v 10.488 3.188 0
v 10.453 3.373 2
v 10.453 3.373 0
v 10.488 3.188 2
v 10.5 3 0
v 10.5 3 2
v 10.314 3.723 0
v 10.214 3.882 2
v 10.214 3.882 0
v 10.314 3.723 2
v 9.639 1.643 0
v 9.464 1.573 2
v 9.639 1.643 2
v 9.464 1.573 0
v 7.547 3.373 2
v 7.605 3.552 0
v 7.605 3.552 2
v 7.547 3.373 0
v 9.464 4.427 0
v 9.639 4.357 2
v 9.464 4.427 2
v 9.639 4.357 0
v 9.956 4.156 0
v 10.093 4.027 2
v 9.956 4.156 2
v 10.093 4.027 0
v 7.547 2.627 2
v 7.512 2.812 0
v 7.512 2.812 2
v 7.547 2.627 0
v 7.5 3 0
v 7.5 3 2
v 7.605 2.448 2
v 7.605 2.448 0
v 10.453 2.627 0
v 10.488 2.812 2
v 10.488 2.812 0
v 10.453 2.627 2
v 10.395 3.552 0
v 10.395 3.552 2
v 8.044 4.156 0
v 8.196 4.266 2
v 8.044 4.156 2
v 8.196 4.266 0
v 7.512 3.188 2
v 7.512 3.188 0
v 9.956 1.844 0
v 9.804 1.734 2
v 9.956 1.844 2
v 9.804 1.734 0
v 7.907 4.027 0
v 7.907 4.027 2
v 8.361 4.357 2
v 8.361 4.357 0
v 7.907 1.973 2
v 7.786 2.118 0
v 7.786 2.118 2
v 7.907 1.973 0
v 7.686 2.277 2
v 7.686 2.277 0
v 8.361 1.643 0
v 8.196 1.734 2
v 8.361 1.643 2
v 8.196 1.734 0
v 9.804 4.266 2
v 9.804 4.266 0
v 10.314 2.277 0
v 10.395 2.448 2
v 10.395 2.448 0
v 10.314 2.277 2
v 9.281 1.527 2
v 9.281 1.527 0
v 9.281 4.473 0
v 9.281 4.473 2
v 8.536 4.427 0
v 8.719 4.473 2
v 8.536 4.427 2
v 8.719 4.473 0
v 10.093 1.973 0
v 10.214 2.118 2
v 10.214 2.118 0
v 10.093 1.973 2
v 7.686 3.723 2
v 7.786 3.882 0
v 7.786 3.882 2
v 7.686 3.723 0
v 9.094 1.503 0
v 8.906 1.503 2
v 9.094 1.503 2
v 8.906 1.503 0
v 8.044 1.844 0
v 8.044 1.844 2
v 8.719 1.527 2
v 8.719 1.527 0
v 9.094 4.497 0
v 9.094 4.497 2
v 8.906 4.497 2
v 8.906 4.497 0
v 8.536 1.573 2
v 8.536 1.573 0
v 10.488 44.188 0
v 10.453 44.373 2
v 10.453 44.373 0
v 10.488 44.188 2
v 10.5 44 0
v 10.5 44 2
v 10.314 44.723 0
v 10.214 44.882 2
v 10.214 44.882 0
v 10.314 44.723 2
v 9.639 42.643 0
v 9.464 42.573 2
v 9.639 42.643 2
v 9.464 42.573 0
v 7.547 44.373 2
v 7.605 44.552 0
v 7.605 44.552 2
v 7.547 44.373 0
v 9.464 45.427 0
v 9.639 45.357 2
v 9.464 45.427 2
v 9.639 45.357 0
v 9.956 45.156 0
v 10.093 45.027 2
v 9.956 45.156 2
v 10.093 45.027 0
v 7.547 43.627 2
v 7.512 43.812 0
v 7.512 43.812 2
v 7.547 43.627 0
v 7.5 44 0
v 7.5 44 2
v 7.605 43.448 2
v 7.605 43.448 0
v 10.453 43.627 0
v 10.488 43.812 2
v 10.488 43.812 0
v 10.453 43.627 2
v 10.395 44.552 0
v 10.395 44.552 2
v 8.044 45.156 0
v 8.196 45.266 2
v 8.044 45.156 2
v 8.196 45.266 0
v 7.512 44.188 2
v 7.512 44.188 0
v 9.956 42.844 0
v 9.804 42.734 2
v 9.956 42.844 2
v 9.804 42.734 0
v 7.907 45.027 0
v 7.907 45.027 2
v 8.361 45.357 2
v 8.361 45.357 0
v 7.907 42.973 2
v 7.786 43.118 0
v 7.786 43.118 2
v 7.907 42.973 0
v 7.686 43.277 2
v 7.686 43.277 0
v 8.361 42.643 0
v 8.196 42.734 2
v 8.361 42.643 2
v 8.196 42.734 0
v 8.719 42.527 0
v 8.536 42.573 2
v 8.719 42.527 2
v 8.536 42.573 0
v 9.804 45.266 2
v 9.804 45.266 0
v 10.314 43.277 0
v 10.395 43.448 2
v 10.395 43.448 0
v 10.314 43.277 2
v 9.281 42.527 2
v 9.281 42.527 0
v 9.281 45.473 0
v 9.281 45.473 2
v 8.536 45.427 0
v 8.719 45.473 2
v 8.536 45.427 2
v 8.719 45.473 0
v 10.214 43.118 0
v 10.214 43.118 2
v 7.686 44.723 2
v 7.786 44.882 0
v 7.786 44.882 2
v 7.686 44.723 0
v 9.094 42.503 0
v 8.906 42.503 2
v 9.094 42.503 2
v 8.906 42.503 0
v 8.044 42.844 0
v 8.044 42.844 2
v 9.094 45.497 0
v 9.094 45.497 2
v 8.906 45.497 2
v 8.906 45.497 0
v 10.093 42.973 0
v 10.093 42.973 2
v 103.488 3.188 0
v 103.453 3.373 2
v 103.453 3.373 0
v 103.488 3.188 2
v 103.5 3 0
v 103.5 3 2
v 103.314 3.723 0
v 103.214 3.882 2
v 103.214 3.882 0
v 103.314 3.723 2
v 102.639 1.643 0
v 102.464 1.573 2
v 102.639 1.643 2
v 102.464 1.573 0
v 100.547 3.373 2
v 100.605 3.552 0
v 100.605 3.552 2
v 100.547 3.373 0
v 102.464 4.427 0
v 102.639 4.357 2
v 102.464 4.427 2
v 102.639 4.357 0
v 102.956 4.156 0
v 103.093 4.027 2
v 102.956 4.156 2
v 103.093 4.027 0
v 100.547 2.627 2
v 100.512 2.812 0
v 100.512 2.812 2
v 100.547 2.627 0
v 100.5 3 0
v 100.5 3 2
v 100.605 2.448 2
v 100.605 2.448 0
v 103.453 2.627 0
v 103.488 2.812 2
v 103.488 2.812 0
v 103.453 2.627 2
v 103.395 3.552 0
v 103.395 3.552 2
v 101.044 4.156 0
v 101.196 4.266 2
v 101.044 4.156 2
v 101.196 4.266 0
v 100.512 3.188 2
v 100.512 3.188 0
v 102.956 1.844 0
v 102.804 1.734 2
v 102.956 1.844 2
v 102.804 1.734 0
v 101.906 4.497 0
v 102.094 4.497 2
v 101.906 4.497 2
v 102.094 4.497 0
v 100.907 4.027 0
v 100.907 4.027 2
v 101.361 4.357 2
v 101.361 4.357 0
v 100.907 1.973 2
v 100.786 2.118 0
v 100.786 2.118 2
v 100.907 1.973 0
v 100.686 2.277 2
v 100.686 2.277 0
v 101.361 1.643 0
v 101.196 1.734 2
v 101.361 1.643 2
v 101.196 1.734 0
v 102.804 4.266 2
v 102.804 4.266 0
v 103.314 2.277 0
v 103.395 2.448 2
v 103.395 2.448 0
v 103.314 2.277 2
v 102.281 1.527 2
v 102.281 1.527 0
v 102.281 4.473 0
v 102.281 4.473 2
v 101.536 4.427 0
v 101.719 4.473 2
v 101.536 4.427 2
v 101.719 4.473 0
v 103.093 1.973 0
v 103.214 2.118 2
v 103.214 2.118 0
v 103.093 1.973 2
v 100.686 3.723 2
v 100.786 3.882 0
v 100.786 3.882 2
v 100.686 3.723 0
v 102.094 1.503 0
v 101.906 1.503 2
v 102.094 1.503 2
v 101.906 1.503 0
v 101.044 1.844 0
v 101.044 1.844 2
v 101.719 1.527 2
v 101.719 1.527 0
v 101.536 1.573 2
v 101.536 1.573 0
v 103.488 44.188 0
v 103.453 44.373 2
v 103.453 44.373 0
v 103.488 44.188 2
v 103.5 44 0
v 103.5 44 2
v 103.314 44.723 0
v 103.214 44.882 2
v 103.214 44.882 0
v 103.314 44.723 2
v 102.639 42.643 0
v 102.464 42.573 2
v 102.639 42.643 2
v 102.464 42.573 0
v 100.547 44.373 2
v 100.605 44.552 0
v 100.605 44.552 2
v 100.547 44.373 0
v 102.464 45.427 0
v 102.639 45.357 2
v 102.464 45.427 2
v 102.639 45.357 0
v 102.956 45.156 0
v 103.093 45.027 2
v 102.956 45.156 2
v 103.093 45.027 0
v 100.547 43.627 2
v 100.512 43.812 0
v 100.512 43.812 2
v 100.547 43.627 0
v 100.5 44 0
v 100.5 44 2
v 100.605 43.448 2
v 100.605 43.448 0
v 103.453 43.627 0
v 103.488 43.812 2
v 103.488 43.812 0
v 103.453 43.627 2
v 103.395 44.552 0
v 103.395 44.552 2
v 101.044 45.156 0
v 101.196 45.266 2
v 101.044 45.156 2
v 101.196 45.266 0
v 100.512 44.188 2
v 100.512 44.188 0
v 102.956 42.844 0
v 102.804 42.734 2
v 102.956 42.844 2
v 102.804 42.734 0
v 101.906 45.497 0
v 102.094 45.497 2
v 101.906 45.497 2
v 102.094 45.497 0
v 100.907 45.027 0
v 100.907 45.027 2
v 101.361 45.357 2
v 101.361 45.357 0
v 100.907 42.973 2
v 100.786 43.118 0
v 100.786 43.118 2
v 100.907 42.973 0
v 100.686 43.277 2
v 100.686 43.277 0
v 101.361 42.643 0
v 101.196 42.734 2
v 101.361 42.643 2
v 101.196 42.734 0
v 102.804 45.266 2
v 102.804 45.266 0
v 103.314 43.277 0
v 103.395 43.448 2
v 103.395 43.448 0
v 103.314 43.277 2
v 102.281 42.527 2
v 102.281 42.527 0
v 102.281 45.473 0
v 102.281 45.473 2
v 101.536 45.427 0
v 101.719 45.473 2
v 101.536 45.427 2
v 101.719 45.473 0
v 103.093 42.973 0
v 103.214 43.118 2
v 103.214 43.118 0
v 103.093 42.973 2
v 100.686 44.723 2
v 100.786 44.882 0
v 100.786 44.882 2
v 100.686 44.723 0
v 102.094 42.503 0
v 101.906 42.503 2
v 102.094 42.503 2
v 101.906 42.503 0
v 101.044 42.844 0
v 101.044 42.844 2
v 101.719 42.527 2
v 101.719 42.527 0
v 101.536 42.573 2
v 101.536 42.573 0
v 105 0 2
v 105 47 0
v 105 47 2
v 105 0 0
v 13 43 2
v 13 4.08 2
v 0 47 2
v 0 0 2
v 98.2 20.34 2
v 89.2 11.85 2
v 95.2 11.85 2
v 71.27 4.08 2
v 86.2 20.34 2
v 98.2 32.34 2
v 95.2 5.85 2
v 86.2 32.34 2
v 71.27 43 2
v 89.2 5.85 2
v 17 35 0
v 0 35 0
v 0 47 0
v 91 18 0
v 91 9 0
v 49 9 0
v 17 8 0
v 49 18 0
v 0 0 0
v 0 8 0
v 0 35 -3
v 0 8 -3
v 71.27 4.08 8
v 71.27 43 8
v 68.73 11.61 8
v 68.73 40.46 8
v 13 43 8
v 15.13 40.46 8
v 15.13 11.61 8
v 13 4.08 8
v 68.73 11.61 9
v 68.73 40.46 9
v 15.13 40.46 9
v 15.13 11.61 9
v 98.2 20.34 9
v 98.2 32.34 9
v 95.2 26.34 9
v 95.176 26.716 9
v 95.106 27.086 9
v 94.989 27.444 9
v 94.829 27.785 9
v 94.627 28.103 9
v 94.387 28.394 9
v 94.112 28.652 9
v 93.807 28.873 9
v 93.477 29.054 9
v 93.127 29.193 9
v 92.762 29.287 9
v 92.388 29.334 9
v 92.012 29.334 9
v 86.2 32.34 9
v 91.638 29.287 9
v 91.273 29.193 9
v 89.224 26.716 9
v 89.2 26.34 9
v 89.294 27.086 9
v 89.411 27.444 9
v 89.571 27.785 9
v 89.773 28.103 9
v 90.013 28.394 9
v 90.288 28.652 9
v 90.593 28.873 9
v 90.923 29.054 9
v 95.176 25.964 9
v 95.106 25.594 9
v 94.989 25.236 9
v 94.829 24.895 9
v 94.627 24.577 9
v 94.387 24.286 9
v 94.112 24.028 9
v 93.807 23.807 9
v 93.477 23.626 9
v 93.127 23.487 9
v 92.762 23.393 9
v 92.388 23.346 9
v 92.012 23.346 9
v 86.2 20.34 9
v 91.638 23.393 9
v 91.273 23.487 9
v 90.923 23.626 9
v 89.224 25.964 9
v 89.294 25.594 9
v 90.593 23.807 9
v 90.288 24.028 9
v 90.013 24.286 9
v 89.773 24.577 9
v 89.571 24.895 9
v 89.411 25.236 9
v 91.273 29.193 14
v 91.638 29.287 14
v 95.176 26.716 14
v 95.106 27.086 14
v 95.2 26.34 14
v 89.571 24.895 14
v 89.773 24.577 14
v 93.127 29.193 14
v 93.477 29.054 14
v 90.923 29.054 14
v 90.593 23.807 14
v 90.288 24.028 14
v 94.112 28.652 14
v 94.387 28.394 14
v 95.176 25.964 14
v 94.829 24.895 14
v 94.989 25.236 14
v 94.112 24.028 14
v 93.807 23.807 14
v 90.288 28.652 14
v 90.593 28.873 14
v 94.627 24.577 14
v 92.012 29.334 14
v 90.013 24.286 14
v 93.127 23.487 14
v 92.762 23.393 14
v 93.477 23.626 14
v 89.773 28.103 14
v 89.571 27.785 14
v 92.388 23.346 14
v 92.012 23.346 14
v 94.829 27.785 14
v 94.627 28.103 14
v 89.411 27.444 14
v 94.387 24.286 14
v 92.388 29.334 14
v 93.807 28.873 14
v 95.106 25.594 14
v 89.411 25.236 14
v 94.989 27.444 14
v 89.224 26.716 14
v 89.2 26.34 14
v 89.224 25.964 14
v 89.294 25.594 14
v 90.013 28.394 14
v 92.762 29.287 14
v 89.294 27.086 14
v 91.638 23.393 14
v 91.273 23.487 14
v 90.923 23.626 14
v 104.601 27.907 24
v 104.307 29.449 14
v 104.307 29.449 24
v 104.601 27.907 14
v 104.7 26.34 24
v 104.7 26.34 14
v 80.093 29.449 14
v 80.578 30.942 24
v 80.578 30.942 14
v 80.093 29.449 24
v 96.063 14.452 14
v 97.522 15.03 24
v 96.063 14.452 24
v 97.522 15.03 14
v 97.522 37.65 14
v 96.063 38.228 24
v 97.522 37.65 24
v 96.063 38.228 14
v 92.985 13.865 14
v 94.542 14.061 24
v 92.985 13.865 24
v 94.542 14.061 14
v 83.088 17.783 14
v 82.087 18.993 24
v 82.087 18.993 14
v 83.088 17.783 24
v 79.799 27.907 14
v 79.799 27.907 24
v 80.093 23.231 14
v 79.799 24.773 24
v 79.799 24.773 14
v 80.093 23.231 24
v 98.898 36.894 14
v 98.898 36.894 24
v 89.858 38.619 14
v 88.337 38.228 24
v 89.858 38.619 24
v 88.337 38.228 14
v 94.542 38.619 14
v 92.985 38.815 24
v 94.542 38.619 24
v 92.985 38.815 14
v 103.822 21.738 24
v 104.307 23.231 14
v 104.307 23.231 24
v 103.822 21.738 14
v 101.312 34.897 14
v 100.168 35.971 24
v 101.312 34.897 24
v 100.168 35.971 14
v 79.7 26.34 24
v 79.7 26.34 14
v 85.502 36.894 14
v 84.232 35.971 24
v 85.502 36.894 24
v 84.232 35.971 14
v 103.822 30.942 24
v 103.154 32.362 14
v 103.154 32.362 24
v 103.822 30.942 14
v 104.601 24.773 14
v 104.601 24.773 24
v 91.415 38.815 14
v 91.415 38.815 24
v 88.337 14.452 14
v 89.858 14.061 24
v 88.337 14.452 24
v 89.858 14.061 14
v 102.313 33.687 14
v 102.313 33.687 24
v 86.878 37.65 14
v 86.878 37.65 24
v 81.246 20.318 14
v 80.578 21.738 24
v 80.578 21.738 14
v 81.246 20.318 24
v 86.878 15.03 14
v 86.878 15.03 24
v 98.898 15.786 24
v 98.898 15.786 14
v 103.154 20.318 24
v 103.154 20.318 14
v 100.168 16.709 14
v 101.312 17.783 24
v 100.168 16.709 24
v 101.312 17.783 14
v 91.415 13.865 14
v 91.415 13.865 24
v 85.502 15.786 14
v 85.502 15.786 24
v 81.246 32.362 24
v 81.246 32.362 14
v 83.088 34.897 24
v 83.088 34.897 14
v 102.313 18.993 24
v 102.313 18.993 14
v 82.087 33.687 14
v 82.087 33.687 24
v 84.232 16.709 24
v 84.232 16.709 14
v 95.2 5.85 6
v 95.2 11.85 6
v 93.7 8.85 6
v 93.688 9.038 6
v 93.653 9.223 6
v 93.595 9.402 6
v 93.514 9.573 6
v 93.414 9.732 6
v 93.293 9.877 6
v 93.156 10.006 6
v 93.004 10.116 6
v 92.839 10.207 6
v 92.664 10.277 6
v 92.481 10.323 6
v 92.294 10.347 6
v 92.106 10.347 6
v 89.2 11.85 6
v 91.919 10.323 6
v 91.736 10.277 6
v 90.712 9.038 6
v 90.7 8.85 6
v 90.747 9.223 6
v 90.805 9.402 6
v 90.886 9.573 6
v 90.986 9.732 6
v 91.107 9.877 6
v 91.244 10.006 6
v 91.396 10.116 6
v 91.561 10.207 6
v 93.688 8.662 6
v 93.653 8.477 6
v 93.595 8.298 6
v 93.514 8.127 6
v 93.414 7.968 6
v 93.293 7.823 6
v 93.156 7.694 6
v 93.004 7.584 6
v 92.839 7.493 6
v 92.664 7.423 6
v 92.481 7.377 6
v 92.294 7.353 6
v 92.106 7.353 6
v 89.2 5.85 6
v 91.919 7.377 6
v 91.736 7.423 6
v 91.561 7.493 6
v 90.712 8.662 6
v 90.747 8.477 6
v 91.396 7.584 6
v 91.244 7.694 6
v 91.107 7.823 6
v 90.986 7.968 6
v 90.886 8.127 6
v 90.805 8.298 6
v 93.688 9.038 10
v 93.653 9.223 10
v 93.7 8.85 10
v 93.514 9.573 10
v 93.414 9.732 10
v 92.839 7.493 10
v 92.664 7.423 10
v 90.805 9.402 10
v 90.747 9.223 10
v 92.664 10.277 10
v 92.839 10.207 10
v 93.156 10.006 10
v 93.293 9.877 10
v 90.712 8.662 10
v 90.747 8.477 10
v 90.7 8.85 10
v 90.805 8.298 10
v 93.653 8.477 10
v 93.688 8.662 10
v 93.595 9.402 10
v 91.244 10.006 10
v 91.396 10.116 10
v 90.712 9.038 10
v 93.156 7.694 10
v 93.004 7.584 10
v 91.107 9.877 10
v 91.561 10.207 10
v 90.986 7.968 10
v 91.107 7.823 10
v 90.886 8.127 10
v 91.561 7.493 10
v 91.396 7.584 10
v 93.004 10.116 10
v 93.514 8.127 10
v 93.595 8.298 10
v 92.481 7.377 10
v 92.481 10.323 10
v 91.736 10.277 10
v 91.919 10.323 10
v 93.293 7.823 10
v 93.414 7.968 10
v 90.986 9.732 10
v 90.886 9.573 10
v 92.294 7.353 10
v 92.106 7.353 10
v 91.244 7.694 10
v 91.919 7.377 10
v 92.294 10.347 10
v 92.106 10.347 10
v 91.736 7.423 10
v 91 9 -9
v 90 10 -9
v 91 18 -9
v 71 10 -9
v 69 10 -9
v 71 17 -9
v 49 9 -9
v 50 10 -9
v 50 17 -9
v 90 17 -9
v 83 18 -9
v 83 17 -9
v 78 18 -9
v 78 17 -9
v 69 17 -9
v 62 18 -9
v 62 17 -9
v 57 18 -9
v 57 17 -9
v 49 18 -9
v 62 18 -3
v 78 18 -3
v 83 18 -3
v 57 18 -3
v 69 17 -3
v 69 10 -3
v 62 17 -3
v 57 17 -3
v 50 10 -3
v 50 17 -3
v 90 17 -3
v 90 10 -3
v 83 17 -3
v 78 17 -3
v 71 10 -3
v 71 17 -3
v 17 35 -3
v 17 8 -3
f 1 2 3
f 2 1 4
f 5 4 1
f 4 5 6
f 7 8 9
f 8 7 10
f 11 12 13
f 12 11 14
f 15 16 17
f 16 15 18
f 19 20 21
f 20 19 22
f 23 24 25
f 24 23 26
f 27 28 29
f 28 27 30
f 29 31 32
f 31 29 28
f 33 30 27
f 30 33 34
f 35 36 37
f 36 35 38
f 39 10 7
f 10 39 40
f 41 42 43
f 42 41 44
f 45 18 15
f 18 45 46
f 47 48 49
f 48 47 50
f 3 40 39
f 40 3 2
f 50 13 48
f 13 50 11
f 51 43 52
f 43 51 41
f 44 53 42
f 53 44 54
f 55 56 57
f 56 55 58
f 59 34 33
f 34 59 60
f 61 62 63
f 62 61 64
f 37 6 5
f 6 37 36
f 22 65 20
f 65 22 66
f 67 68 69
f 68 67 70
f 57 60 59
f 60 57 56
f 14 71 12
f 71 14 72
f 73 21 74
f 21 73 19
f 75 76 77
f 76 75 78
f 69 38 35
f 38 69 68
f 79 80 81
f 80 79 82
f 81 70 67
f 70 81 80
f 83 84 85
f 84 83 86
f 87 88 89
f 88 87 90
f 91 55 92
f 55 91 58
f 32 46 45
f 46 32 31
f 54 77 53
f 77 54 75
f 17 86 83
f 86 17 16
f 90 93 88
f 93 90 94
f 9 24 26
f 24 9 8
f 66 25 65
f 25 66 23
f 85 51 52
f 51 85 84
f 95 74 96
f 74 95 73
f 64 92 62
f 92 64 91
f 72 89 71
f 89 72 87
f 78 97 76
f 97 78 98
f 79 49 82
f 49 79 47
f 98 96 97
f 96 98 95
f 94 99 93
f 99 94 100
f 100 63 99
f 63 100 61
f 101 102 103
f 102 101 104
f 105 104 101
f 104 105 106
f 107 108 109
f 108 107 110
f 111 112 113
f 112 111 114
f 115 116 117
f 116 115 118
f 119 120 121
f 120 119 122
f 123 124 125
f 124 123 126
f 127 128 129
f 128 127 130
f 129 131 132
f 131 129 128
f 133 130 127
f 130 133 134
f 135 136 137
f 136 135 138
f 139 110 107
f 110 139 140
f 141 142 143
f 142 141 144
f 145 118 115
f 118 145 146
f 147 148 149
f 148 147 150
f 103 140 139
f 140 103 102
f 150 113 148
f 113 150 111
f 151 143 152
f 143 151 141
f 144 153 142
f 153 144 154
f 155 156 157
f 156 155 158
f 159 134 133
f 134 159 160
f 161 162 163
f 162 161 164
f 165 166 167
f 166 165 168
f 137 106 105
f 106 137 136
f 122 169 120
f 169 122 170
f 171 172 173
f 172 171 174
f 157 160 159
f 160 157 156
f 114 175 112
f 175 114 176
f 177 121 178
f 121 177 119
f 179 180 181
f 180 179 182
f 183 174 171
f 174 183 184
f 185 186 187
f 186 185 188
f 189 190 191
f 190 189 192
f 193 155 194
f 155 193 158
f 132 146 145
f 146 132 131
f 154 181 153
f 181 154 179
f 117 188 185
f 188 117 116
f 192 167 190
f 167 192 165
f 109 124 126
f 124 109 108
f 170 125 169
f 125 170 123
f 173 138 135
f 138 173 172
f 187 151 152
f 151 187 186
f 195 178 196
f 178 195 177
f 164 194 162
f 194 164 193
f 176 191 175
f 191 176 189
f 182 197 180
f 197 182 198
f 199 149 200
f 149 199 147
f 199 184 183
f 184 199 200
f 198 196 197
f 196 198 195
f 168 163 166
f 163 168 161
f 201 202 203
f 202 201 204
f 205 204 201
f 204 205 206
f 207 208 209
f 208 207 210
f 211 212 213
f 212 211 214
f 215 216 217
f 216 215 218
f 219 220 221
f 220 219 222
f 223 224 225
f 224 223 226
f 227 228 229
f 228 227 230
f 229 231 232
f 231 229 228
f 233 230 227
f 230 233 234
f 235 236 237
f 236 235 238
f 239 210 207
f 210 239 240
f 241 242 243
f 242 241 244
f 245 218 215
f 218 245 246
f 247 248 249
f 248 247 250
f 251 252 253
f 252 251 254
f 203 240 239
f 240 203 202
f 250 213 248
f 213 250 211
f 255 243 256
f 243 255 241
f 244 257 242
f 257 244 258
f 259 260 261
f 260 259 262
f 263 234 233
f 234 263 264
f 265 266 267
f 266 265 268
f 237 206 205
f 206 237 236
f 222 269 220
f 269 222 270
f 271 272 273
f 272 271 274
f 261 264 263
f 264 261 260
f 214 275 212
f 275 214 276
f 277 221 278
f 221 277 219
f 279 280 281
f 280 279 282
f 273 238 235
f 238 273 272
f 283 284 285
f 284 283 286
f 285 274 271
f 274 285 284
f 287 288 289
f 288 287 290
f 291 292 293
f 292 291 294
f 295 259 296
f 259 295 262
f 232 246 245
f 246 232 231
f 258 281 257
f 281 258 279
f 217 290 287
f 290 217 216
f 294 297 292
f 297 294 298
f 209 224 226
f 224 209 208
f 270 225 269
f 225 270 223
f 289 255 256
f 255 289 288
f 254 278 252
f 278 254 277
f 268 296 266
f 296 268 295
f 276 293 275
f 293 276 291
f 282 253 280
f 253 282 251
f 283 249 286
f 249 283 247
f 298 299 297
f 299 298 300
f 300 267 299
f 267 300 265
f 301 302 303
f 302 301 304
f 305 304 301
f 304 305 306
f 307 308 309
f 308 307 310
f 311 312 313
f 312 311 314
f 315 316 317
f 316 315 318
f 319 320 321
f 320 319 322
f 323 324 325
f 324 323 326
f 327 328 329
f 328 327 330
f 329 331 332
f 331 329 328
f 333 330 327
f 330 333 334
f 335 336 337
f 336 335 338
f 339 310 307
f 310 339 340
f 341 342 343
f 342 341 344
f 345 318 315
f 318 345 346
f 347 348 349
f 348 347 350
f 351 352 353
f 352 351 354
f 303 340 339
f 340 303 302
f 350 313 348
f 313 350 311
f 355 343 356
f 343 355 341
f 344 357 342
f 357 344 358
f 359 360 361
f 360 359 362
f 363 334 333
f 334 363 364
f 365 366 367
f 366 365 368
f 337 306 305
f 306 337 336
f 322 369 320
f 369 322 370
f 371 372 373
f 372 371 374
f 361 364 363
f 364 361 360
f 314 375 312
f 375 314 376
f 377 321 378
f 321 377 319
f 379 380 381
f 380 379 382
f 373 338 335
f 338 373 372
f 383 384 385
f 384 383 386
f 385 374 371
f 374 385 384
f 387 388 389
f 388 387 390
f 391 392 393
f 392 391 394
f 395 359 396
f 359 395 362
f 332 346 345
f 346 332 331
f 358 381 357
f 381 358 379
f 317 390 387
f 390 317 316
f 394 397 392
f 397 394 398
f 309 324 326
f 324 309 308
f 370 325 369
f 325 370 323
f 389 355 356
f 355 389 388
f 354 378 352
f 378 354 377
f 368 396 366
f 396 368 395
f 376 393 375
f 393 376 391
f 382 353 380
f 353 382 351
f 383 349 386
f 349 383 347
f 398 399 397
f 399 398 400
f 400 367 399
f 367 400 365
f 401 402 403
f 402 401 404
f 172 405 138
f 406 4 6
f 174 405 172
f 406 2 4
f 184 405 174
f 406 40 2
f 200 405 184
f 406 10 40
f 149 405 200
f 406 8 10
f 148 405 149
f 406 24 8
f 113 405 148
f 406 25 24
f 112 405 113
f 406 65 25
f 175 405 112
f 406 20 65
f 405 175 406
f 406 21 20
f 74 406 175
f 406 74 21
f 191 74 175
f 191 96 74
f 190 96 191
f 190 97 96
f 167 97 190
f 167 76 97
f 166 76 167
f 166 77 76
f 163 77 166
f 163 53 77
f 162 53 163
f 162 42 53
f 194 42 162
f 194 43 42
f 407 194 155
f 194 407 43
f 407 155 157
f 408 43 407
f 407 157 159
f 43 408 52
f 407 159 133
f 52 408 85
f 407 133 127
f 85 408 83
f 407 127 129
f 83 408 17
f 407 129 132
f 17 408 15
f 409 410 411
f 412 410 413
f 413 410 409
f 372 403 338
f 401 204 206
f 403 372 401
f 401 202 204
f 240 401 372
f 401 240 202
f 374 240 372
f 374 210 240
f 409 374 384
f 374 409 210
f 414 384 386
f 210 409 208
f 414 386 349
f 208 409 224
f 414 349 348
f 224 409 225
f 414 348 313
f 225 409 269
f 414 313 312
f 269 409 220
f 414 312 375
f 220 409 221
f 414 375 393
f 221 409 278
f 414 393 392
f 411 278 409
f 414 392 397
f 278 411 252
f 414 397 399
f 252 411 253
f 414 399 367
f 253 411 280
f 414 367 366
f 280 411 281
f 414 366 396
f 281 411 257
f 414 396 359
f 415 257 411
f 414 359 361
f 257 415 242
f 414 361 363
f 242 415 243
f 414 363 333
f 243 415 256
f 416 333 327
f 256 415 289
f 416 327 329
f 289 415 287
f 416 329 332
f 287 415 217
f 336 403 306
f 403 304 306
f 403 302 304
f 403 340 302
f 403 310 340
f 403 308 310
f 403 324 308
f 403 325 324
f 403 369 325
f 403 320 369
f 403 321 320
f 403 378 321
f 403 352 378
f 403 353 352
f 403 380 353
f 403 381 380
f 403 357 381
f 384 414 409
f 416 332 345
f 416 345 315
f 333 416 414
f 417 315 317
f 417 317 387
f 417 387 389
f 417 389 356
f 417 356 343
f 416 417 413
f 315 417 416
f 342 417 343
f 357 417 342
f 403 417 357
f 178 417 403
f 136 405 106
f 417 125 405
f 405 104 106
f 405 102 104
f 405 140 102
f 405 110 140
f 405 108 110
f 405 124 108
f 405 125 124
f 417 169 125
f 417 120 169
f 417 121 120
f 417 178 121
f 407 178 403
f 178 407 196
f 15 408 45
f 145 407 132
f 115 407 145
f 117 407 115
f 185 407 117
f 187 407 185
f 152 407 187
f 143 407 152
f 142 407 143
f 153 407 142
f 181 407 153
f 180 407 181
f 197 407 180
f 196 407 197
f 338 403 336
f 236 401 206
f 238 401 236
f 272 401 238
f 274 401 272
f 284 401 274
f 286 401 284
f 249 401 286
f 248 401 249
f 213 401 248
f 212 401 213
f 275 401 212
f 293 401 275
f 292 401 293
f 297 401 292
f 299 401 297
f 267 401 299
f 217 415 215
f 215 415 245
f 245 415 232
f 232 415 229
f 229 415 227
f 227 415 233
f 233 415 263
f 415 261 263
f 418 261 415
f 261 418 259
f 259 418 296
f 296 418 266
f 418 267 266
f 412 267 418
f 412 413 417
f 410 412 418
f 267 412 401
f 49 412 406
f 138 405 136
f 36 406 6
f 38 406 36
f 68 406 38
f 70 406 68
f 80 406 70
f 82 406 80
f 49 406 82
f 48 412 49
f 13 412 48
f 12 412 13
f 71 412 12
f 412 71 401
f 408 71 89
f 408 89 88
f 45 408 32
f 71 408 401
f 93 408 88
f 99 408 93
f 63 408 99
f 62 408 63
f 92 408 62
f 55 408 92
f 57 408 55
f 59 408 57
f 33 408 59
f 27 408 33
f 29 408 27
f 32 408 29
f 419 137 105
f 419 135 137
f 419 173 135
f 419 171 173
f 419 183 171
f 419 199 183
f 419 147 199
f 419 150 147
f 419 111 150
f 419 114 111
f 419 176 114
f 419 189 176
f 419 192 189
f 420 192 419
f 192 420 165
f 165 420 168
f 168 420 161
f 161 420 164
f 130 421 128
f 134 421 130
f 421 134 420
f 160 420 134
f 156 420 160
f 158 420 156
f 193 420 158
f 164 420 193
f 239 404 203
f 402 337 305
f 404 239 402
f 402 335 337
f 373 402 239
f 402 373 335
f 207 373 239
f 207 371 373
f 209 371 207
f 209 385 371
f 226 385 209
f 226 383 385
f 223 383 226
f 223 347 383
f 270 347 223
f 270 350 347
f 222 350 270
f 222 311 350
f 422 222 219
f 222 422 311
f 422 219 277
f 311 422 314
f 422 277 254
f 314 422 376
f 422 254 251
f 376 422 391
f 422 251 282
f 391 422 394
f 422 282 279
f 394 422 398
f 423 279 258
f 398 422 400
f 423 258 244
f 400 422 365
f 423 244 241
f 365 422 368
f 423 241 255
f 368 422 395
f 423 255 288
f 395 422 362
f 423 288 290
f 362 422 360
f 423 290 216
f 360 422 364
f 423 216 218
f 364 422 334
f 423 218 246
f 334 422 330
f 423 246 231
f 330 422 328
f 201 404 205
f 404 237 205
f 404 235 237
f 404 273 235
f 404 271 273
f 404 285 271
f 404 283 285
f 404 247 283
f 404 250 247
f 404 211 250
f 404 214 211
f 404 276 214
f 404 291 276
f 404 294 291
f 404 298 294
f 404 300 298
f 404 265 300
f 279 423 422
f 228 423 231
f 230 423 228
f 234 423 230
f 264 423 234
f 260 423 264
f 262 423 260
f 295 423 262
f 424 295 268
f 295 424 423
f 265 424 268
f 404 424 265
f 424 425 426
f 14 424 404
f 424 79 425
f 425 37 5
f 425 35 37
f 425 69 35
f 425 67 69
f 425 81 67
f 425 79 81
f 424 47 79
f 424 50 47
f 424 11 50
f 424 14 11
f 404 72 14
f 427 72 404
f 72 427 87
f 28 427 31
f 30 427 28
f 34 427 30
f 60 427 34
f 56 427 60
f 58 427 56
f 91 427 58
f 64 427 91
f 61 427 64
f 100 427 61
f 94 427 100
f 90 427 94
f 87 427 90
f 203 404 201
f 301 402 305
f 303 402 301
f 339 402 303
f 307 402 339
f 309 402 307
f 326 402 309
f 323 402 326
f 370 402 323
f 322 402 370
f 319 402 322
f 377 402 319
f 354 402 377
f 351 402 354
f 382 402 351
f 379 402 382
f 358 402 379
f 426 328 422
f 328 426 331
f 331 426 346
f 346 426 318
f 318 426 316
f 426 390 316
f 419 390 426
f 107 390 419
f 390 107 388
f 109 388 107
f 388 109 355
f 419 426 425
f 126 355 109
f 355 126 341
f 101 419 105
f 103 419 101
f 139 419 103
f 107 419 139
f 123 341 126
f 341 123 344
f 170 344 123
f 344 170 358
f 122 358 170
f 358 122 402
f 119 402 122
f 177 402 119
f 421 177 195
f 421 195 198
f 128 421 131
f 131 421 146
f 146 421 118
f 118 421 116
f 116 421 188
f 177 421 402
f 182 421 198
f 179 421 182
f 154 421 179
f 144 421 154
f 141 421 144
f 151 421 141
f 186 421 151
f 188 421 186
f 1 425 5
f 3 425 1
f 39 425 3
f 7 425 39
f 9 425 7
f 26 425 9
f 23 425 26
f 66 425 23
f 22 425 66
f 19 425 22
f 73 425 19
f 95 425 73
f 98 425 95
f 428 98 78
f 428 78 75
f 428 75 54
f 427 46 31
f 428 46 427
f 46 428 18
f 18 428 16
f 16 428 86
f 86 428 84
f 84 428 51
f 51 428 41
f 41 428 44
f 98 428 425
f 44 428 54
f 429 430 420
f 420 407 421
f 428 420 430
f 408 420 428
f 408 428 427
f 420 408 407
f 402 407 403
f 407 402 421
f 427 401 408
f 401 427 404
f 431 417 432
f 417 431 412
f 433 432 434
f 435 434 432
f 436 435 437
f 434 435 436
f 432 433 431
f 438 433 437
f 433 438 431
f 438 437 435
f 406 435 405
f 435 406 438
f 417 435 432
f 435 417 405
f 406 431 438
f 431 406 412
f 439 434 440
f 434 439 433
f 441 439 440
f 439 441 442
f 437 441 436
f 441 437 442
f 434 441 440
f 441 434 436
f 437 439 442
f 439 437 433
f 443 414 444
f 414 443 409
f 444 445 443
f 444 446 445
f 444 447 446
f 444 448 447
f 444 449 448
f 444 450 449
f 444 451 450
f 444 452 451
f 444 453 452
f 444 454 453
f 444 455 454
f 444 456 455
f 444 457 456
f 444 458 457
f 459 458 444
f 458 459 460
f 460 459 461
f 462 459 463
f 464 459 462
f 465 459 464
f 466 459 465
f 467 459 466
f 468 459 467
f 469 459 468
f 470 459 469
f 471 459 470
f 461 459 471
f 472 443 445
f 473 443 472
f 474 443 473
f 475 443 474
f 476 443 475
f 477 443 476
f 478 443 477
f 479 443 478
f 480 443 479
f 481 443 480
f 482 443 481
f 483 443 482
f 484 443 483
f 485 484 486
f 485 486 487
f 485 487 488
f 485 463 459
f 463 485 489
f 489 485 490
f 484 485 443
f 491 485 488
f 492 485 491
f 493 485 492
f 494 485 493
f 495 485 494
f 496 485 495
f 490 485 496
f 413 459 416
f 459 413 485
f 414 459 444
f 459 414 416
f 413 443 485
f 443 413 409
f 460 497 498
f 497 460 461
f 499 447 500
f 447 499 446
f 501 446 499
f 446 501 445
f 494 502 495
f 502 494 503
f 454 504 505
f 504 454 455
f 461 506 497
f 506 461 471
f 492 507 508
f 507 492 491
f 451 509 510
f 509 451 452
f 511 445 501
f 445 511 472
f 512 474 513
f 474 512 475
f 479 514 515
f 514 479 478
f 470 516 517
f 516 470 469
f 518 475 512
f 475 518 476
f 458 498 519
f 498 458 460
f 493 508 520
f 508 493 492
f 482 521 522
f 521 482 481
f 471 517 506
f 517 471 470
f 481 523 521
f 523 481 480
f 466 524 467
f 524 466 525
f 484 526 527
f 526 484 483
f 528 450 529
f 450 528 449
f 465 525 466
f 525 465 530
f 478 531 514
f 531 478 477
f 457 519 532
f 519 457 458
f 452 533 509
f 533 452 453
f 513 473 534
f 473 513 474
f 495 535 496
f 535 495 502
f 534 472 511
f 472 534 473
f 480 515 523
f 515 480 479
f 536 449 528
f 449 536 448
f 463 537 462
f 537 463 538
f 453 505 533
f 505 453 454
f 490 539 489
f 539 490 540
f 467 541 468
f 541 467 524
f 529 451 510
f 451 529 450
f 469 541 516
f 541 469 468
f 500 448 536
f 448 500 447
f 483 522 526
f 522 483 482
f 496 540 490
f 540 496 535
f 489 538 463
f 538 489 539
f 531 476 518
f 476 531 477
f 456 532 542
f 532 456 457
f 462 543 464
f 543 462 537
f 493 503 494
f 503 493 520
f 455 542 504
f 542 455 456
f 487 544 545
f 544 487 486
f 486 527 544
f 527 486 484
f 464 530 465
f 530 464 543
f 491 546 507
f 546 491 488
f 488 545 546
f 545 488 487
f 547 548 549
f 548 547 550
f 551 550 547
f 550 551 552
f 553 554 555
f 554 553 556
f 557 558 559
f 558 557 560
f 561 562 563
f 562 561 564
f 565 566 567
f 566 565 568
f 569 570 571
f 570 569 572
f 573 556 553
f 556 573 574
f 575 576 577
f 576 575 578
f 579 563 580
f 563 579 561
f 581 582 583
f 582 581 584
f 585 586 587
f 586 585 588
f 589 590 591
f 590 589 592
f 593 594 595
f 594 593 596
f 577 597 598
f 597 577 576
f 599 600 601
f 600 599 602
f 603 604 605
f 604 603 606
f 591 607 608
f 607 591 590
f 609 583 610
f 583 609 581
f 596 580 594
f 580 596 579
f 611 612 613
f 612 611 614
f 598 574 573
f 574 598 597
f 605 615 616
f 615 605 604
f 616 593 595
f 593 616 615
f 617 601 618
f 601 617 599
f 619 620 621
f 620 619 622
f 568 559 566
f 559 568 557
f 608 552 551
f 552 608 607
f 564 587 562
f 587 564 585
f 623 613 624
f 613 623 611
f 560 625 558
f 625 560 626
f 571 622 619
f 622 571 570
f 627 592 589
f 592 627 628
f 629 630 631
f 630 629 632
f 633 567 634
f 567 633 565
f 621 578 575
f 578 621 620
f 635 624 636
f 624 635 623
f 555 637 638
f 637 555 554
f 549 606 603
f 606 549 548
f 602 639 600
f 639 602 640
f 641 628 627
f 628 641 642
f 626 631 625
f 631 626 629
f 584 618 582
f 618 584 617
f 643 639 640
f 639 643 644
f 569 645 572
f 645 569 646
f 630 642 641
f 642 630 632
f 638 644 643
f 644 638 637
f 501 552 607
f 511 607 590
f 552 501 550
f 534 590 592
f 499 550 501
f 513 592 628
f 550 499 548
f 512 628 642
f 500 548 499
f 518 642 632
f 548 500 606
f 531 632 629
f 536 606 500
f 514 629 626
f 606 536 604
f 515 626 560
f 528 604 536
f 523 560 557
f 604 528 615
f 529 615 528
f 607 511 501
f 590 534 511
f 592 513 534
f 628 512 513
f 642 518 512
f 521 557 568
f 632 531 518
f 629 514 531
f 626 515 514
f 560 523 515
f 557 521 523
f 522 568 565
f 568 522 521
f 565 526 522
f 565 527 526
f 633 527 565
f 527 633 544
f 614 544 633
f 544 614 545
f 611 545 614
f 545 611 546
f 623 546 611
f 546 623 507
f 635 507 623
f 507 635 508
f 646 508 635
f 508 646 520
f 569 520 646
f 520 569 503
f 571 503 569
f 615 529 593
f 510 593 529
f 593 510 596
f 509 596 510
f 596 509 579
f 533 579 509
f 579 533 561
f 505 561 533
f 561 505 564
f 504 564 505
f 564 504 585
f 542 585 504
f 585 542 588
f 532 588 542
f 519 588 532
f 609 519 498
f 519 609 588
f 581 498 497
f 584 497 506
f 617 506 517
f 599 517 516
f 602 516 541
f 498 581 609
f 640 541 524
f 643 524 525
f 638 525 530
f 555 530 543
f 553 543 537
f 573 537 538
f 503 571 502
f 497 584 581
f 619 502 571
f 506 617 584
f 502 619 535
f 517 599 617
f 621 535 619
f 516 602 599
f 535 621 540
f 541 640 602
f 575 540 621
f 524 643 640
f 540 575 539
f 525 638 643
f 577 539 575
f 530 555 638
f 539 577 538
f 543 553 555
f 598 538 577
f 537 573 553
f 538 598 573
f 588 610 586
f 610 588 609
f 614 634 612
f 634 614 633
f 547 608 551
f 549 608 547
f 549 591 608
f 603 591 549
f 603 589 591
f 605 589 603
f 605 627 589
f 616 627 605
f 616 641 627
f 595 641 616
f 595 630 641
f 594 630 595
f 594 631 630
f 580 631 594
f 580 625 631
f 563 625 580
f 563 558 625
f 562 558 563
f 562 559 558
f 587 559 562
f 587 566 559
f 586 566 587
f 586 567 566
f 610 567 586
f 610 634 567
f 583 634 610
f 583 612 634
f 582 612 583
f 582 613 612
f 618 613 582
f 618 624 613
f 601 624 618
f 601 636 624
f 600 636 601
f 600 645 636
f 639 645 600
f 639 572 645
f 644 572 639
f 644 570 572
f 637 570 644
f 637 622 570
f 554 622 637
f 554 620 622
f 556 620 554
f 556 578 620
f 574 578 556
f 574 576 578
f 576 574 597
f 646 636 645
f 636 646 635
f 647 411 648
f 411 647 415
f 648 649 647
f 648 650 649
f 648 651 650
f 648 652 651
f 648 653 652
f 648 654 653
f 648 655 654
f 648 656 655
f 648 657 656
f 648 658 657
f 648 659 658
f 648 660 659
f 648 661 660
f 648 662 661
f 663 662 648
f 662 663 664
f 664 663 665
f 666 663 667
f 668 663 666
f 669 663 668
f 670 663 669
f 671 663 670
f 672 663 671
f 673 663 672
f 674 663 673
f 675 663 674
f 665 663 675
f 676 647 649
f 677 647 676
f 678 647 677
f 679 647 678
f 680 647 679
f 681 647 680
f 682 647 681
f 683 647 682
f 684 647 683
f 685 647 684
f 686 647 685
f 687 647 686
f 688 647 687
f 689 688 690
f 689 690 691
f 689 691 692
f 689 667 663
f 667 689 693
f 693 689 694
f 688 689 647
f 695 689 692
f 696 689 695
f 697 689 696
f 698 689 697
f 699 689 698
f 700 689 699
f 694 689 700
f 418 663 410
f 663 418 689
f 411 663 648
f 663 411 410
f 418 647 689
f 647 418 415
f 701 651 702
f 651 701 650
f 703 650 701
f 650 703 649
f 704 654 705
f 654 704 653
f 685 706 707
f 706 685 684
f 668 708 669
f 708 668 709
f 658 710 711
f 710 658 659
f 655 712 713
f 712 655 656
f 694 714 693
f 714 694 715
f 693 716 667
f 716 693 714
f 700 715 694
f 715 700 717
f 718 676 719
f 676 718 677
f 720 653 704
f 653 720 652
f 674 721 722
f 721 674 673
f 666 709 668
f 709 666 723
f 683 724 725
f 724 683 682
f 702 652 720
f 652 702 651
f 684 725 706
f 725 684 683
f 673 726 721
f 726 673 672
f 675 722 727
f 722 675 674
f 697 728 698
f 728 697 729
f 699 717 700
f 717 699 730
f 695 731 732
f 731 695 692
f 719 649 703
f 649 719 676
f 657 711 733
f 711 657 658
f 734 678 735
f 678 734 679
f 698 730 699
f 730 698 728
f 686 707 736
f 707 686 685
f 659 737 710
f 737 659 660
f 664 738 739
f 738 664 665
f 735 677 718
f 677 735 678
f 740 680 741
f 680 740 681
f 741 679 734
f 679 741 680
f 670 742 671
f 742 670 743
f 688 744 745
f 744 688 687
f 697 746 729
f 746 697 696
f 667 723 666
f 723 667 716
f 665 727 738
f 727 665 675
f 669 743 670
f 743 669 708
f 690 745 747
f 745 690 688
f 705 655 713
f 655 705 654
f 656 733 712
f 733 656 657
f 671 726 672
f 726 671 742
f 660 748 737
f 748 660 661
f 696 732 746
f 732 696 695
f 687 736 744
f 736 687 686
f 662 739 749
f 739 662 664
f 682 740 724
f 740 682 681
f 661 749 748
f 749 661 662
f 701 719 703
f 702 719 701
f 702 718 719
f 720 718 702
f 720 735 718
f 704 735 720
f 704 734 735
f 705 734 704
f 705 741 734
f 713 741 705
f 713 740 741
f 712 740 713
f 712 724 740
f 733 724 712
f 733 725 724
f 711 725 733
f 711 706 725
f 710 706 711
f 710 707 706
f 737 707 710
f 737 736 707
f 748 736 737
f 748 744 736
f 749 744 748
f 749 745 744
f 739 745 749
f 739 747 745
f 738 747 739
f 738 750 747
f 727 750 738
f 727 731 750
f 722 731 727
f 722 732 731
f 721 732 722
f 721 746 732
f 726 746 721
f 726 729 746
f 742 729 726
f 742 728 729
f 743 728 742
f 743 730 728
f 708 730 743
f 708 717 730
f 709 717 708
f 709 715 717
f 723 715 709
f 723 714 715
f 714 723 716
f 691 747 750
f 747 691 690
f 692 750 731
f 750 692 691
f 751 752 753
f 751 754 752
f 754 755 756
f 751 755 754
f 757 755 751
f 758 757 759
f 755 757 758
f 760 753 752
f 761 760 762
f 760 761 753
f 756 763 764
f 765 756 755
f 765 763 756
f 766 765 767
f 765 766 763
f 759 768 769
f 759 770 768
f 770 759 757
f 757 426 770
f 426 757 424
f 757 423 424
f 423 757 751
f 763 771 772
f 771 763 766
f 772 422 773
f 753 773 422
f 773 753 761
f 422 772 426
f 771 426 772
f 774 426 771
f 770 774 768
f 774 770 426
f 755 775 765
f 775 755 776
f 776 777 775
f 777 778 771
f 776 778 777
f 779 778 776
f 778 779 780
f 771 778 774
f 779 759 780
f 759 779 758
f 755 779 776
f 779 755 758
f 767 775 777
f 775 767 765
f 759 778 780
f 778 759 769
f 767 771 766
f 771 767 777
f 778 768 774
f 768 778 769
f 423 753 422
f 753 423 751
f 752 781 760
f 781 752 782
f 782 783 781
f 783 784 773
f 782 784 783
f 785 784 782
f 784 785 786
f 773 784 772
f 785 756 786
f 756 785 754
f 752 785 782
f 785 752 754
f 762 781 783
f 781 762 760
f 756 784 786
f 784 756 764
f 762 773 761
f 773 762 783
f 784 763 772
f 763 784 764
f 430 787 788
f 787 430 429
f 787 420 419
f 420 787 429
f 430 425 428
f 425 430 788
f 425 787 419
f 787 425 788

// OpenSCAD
// file: display_config.scad
display_pcb_height=47;
display_pcb_width=105;
display_hole_size= 3.0;
cut_limit = 1.0;

display_hole_x_offset=9;
display_hole_y_offset=3;
display_hole_between=93;

display_screen_width=58.27;
display_screen_height=38.92;
display_real_screen_width=53.6;
display_real_screen_height=28.85;
display_real_screen_offset_x=display_screen_width-display_real_screen_width-2.54;
display_real_screen_offset_y=display_screen_height-display_real_screen_height-2.54;
display_x_shift=13;
display_y_shift = display_pcb_height-display_screen_height-4.0;
display_holes=[[display_hole_x_offset, display_hole_y_offset],
               [display_hole_x_offset, display_pcb_height-display_hole_y_offset],
               [display_hole_between+display_hole_x_offset, display_hole_y_offset],
               [display_hole_between+display_hole_x_offset, display_pcb_height-display_hole_y_offset]];
               
display_pot_side=12;
display_pot_height=7;

display_pot_x_shift = 92.2;
display_pot_y_shift = display_pcb_height-20.66;
echo(display_pot_y_shift);

display_switch_x_shift= display_pot_x_shift;
display_switch_y_shift = 8.85;
// main file
include <display_config.scad>

module display_holes_row() {
    $fn=50;
    translate([display_hole_x_offset,display_hole_y_offset,-cut_limit]) cylinder(h=20,d=display_hole_size);
    translate([display_hole_x_offset,display_pcb_height-display_hole_y_offset,-cut_limit]) cylinder(h=20,d=display_hole_size);
}


module ghost_display() {
    $fn=50;
    module fakePCB() {        
        difference() {
            color([0,1.0,0]) cube([display_pcb_width,display_pcb_height, 2.00]);
            display_holes_row();
            translate([display_hole_between,0,0]) display_holes_row();
        }
    }
    
    module fakeDisplay() {
        union() {
            cube([display_screen_width, display_screen_height,6.00]);
            color("black") 
                translate([display_real_screen_offset_x, display_real_screen_offset_y,1]) cube([display_real_screen_width, display_real_screen_height,6.00]);
        }
    }
    
    module fakePot() {  // Reference X is middle
        translate([-display_pot_side/2, -display_pot_side/2,0]) union() { 
        color([0,0,1.0]) cube([display_pot_side, display_pot_side, display_pot_height]);
        translate([display_pot_side/2, display_pot_side/2, display_pot_height]) cylinder(10, d=6);
        color([0,0,0,0.3]) translate([display_pot_side/2, display_pot_side/2, 12]) cylinder(10, d=25);
    }
    }

    switch_side=6;
    switch_height=4;
    bite_height=4;
    switch_round_diameter=3;
    module fakeSwitch() { // Reference X middle
        translate([-switch_side/2, -switch_side/2 ,0]) union() { 
            color([0.4,0.4,0.4]) cube([switch_side,switch_side, switch_height]);
            color([0,0,0]) translate([switch_side/2, switch_side/2, switch_height]) cylinder(bite_height,d=switch_round_diameter);
    }
    }

    connector_height=9;
    module connector() {
        difference() {
            cube([21,connector_height,9]);
            translate([1,1,1+cut_limit*2]) cube([19,7,8+cut_limit]); // middle
            translate([8,-cut_limit,1+cut_limit*2])cube([5,2+cut_limit,9]); // notch
        }
    }

    sd_height=27;
    module sdCardSlot() {
        cube([17 ,27 ,3]);
    }
    
    fakePCB();
    translate([display_x_shift, display_y_shift,2.0]) fakeDisplay();
    translate([display_pot_x_shift,display_pot_y_shift, 2.0]) fakePot();
    translate([display_switch_x_shift, display_switch_y_shift,2.0]) fakeSwitch();
    translate([49,connector_height+9,0]) rotate([180,0,0]) connector();
    translate([49+21,connector_height+9,0]) rotate([180,0,0]) connector();
    translate([0,sd_height+8,0]) rotate([180,0,0]) sdCardSlot();
}


ghost_display();
